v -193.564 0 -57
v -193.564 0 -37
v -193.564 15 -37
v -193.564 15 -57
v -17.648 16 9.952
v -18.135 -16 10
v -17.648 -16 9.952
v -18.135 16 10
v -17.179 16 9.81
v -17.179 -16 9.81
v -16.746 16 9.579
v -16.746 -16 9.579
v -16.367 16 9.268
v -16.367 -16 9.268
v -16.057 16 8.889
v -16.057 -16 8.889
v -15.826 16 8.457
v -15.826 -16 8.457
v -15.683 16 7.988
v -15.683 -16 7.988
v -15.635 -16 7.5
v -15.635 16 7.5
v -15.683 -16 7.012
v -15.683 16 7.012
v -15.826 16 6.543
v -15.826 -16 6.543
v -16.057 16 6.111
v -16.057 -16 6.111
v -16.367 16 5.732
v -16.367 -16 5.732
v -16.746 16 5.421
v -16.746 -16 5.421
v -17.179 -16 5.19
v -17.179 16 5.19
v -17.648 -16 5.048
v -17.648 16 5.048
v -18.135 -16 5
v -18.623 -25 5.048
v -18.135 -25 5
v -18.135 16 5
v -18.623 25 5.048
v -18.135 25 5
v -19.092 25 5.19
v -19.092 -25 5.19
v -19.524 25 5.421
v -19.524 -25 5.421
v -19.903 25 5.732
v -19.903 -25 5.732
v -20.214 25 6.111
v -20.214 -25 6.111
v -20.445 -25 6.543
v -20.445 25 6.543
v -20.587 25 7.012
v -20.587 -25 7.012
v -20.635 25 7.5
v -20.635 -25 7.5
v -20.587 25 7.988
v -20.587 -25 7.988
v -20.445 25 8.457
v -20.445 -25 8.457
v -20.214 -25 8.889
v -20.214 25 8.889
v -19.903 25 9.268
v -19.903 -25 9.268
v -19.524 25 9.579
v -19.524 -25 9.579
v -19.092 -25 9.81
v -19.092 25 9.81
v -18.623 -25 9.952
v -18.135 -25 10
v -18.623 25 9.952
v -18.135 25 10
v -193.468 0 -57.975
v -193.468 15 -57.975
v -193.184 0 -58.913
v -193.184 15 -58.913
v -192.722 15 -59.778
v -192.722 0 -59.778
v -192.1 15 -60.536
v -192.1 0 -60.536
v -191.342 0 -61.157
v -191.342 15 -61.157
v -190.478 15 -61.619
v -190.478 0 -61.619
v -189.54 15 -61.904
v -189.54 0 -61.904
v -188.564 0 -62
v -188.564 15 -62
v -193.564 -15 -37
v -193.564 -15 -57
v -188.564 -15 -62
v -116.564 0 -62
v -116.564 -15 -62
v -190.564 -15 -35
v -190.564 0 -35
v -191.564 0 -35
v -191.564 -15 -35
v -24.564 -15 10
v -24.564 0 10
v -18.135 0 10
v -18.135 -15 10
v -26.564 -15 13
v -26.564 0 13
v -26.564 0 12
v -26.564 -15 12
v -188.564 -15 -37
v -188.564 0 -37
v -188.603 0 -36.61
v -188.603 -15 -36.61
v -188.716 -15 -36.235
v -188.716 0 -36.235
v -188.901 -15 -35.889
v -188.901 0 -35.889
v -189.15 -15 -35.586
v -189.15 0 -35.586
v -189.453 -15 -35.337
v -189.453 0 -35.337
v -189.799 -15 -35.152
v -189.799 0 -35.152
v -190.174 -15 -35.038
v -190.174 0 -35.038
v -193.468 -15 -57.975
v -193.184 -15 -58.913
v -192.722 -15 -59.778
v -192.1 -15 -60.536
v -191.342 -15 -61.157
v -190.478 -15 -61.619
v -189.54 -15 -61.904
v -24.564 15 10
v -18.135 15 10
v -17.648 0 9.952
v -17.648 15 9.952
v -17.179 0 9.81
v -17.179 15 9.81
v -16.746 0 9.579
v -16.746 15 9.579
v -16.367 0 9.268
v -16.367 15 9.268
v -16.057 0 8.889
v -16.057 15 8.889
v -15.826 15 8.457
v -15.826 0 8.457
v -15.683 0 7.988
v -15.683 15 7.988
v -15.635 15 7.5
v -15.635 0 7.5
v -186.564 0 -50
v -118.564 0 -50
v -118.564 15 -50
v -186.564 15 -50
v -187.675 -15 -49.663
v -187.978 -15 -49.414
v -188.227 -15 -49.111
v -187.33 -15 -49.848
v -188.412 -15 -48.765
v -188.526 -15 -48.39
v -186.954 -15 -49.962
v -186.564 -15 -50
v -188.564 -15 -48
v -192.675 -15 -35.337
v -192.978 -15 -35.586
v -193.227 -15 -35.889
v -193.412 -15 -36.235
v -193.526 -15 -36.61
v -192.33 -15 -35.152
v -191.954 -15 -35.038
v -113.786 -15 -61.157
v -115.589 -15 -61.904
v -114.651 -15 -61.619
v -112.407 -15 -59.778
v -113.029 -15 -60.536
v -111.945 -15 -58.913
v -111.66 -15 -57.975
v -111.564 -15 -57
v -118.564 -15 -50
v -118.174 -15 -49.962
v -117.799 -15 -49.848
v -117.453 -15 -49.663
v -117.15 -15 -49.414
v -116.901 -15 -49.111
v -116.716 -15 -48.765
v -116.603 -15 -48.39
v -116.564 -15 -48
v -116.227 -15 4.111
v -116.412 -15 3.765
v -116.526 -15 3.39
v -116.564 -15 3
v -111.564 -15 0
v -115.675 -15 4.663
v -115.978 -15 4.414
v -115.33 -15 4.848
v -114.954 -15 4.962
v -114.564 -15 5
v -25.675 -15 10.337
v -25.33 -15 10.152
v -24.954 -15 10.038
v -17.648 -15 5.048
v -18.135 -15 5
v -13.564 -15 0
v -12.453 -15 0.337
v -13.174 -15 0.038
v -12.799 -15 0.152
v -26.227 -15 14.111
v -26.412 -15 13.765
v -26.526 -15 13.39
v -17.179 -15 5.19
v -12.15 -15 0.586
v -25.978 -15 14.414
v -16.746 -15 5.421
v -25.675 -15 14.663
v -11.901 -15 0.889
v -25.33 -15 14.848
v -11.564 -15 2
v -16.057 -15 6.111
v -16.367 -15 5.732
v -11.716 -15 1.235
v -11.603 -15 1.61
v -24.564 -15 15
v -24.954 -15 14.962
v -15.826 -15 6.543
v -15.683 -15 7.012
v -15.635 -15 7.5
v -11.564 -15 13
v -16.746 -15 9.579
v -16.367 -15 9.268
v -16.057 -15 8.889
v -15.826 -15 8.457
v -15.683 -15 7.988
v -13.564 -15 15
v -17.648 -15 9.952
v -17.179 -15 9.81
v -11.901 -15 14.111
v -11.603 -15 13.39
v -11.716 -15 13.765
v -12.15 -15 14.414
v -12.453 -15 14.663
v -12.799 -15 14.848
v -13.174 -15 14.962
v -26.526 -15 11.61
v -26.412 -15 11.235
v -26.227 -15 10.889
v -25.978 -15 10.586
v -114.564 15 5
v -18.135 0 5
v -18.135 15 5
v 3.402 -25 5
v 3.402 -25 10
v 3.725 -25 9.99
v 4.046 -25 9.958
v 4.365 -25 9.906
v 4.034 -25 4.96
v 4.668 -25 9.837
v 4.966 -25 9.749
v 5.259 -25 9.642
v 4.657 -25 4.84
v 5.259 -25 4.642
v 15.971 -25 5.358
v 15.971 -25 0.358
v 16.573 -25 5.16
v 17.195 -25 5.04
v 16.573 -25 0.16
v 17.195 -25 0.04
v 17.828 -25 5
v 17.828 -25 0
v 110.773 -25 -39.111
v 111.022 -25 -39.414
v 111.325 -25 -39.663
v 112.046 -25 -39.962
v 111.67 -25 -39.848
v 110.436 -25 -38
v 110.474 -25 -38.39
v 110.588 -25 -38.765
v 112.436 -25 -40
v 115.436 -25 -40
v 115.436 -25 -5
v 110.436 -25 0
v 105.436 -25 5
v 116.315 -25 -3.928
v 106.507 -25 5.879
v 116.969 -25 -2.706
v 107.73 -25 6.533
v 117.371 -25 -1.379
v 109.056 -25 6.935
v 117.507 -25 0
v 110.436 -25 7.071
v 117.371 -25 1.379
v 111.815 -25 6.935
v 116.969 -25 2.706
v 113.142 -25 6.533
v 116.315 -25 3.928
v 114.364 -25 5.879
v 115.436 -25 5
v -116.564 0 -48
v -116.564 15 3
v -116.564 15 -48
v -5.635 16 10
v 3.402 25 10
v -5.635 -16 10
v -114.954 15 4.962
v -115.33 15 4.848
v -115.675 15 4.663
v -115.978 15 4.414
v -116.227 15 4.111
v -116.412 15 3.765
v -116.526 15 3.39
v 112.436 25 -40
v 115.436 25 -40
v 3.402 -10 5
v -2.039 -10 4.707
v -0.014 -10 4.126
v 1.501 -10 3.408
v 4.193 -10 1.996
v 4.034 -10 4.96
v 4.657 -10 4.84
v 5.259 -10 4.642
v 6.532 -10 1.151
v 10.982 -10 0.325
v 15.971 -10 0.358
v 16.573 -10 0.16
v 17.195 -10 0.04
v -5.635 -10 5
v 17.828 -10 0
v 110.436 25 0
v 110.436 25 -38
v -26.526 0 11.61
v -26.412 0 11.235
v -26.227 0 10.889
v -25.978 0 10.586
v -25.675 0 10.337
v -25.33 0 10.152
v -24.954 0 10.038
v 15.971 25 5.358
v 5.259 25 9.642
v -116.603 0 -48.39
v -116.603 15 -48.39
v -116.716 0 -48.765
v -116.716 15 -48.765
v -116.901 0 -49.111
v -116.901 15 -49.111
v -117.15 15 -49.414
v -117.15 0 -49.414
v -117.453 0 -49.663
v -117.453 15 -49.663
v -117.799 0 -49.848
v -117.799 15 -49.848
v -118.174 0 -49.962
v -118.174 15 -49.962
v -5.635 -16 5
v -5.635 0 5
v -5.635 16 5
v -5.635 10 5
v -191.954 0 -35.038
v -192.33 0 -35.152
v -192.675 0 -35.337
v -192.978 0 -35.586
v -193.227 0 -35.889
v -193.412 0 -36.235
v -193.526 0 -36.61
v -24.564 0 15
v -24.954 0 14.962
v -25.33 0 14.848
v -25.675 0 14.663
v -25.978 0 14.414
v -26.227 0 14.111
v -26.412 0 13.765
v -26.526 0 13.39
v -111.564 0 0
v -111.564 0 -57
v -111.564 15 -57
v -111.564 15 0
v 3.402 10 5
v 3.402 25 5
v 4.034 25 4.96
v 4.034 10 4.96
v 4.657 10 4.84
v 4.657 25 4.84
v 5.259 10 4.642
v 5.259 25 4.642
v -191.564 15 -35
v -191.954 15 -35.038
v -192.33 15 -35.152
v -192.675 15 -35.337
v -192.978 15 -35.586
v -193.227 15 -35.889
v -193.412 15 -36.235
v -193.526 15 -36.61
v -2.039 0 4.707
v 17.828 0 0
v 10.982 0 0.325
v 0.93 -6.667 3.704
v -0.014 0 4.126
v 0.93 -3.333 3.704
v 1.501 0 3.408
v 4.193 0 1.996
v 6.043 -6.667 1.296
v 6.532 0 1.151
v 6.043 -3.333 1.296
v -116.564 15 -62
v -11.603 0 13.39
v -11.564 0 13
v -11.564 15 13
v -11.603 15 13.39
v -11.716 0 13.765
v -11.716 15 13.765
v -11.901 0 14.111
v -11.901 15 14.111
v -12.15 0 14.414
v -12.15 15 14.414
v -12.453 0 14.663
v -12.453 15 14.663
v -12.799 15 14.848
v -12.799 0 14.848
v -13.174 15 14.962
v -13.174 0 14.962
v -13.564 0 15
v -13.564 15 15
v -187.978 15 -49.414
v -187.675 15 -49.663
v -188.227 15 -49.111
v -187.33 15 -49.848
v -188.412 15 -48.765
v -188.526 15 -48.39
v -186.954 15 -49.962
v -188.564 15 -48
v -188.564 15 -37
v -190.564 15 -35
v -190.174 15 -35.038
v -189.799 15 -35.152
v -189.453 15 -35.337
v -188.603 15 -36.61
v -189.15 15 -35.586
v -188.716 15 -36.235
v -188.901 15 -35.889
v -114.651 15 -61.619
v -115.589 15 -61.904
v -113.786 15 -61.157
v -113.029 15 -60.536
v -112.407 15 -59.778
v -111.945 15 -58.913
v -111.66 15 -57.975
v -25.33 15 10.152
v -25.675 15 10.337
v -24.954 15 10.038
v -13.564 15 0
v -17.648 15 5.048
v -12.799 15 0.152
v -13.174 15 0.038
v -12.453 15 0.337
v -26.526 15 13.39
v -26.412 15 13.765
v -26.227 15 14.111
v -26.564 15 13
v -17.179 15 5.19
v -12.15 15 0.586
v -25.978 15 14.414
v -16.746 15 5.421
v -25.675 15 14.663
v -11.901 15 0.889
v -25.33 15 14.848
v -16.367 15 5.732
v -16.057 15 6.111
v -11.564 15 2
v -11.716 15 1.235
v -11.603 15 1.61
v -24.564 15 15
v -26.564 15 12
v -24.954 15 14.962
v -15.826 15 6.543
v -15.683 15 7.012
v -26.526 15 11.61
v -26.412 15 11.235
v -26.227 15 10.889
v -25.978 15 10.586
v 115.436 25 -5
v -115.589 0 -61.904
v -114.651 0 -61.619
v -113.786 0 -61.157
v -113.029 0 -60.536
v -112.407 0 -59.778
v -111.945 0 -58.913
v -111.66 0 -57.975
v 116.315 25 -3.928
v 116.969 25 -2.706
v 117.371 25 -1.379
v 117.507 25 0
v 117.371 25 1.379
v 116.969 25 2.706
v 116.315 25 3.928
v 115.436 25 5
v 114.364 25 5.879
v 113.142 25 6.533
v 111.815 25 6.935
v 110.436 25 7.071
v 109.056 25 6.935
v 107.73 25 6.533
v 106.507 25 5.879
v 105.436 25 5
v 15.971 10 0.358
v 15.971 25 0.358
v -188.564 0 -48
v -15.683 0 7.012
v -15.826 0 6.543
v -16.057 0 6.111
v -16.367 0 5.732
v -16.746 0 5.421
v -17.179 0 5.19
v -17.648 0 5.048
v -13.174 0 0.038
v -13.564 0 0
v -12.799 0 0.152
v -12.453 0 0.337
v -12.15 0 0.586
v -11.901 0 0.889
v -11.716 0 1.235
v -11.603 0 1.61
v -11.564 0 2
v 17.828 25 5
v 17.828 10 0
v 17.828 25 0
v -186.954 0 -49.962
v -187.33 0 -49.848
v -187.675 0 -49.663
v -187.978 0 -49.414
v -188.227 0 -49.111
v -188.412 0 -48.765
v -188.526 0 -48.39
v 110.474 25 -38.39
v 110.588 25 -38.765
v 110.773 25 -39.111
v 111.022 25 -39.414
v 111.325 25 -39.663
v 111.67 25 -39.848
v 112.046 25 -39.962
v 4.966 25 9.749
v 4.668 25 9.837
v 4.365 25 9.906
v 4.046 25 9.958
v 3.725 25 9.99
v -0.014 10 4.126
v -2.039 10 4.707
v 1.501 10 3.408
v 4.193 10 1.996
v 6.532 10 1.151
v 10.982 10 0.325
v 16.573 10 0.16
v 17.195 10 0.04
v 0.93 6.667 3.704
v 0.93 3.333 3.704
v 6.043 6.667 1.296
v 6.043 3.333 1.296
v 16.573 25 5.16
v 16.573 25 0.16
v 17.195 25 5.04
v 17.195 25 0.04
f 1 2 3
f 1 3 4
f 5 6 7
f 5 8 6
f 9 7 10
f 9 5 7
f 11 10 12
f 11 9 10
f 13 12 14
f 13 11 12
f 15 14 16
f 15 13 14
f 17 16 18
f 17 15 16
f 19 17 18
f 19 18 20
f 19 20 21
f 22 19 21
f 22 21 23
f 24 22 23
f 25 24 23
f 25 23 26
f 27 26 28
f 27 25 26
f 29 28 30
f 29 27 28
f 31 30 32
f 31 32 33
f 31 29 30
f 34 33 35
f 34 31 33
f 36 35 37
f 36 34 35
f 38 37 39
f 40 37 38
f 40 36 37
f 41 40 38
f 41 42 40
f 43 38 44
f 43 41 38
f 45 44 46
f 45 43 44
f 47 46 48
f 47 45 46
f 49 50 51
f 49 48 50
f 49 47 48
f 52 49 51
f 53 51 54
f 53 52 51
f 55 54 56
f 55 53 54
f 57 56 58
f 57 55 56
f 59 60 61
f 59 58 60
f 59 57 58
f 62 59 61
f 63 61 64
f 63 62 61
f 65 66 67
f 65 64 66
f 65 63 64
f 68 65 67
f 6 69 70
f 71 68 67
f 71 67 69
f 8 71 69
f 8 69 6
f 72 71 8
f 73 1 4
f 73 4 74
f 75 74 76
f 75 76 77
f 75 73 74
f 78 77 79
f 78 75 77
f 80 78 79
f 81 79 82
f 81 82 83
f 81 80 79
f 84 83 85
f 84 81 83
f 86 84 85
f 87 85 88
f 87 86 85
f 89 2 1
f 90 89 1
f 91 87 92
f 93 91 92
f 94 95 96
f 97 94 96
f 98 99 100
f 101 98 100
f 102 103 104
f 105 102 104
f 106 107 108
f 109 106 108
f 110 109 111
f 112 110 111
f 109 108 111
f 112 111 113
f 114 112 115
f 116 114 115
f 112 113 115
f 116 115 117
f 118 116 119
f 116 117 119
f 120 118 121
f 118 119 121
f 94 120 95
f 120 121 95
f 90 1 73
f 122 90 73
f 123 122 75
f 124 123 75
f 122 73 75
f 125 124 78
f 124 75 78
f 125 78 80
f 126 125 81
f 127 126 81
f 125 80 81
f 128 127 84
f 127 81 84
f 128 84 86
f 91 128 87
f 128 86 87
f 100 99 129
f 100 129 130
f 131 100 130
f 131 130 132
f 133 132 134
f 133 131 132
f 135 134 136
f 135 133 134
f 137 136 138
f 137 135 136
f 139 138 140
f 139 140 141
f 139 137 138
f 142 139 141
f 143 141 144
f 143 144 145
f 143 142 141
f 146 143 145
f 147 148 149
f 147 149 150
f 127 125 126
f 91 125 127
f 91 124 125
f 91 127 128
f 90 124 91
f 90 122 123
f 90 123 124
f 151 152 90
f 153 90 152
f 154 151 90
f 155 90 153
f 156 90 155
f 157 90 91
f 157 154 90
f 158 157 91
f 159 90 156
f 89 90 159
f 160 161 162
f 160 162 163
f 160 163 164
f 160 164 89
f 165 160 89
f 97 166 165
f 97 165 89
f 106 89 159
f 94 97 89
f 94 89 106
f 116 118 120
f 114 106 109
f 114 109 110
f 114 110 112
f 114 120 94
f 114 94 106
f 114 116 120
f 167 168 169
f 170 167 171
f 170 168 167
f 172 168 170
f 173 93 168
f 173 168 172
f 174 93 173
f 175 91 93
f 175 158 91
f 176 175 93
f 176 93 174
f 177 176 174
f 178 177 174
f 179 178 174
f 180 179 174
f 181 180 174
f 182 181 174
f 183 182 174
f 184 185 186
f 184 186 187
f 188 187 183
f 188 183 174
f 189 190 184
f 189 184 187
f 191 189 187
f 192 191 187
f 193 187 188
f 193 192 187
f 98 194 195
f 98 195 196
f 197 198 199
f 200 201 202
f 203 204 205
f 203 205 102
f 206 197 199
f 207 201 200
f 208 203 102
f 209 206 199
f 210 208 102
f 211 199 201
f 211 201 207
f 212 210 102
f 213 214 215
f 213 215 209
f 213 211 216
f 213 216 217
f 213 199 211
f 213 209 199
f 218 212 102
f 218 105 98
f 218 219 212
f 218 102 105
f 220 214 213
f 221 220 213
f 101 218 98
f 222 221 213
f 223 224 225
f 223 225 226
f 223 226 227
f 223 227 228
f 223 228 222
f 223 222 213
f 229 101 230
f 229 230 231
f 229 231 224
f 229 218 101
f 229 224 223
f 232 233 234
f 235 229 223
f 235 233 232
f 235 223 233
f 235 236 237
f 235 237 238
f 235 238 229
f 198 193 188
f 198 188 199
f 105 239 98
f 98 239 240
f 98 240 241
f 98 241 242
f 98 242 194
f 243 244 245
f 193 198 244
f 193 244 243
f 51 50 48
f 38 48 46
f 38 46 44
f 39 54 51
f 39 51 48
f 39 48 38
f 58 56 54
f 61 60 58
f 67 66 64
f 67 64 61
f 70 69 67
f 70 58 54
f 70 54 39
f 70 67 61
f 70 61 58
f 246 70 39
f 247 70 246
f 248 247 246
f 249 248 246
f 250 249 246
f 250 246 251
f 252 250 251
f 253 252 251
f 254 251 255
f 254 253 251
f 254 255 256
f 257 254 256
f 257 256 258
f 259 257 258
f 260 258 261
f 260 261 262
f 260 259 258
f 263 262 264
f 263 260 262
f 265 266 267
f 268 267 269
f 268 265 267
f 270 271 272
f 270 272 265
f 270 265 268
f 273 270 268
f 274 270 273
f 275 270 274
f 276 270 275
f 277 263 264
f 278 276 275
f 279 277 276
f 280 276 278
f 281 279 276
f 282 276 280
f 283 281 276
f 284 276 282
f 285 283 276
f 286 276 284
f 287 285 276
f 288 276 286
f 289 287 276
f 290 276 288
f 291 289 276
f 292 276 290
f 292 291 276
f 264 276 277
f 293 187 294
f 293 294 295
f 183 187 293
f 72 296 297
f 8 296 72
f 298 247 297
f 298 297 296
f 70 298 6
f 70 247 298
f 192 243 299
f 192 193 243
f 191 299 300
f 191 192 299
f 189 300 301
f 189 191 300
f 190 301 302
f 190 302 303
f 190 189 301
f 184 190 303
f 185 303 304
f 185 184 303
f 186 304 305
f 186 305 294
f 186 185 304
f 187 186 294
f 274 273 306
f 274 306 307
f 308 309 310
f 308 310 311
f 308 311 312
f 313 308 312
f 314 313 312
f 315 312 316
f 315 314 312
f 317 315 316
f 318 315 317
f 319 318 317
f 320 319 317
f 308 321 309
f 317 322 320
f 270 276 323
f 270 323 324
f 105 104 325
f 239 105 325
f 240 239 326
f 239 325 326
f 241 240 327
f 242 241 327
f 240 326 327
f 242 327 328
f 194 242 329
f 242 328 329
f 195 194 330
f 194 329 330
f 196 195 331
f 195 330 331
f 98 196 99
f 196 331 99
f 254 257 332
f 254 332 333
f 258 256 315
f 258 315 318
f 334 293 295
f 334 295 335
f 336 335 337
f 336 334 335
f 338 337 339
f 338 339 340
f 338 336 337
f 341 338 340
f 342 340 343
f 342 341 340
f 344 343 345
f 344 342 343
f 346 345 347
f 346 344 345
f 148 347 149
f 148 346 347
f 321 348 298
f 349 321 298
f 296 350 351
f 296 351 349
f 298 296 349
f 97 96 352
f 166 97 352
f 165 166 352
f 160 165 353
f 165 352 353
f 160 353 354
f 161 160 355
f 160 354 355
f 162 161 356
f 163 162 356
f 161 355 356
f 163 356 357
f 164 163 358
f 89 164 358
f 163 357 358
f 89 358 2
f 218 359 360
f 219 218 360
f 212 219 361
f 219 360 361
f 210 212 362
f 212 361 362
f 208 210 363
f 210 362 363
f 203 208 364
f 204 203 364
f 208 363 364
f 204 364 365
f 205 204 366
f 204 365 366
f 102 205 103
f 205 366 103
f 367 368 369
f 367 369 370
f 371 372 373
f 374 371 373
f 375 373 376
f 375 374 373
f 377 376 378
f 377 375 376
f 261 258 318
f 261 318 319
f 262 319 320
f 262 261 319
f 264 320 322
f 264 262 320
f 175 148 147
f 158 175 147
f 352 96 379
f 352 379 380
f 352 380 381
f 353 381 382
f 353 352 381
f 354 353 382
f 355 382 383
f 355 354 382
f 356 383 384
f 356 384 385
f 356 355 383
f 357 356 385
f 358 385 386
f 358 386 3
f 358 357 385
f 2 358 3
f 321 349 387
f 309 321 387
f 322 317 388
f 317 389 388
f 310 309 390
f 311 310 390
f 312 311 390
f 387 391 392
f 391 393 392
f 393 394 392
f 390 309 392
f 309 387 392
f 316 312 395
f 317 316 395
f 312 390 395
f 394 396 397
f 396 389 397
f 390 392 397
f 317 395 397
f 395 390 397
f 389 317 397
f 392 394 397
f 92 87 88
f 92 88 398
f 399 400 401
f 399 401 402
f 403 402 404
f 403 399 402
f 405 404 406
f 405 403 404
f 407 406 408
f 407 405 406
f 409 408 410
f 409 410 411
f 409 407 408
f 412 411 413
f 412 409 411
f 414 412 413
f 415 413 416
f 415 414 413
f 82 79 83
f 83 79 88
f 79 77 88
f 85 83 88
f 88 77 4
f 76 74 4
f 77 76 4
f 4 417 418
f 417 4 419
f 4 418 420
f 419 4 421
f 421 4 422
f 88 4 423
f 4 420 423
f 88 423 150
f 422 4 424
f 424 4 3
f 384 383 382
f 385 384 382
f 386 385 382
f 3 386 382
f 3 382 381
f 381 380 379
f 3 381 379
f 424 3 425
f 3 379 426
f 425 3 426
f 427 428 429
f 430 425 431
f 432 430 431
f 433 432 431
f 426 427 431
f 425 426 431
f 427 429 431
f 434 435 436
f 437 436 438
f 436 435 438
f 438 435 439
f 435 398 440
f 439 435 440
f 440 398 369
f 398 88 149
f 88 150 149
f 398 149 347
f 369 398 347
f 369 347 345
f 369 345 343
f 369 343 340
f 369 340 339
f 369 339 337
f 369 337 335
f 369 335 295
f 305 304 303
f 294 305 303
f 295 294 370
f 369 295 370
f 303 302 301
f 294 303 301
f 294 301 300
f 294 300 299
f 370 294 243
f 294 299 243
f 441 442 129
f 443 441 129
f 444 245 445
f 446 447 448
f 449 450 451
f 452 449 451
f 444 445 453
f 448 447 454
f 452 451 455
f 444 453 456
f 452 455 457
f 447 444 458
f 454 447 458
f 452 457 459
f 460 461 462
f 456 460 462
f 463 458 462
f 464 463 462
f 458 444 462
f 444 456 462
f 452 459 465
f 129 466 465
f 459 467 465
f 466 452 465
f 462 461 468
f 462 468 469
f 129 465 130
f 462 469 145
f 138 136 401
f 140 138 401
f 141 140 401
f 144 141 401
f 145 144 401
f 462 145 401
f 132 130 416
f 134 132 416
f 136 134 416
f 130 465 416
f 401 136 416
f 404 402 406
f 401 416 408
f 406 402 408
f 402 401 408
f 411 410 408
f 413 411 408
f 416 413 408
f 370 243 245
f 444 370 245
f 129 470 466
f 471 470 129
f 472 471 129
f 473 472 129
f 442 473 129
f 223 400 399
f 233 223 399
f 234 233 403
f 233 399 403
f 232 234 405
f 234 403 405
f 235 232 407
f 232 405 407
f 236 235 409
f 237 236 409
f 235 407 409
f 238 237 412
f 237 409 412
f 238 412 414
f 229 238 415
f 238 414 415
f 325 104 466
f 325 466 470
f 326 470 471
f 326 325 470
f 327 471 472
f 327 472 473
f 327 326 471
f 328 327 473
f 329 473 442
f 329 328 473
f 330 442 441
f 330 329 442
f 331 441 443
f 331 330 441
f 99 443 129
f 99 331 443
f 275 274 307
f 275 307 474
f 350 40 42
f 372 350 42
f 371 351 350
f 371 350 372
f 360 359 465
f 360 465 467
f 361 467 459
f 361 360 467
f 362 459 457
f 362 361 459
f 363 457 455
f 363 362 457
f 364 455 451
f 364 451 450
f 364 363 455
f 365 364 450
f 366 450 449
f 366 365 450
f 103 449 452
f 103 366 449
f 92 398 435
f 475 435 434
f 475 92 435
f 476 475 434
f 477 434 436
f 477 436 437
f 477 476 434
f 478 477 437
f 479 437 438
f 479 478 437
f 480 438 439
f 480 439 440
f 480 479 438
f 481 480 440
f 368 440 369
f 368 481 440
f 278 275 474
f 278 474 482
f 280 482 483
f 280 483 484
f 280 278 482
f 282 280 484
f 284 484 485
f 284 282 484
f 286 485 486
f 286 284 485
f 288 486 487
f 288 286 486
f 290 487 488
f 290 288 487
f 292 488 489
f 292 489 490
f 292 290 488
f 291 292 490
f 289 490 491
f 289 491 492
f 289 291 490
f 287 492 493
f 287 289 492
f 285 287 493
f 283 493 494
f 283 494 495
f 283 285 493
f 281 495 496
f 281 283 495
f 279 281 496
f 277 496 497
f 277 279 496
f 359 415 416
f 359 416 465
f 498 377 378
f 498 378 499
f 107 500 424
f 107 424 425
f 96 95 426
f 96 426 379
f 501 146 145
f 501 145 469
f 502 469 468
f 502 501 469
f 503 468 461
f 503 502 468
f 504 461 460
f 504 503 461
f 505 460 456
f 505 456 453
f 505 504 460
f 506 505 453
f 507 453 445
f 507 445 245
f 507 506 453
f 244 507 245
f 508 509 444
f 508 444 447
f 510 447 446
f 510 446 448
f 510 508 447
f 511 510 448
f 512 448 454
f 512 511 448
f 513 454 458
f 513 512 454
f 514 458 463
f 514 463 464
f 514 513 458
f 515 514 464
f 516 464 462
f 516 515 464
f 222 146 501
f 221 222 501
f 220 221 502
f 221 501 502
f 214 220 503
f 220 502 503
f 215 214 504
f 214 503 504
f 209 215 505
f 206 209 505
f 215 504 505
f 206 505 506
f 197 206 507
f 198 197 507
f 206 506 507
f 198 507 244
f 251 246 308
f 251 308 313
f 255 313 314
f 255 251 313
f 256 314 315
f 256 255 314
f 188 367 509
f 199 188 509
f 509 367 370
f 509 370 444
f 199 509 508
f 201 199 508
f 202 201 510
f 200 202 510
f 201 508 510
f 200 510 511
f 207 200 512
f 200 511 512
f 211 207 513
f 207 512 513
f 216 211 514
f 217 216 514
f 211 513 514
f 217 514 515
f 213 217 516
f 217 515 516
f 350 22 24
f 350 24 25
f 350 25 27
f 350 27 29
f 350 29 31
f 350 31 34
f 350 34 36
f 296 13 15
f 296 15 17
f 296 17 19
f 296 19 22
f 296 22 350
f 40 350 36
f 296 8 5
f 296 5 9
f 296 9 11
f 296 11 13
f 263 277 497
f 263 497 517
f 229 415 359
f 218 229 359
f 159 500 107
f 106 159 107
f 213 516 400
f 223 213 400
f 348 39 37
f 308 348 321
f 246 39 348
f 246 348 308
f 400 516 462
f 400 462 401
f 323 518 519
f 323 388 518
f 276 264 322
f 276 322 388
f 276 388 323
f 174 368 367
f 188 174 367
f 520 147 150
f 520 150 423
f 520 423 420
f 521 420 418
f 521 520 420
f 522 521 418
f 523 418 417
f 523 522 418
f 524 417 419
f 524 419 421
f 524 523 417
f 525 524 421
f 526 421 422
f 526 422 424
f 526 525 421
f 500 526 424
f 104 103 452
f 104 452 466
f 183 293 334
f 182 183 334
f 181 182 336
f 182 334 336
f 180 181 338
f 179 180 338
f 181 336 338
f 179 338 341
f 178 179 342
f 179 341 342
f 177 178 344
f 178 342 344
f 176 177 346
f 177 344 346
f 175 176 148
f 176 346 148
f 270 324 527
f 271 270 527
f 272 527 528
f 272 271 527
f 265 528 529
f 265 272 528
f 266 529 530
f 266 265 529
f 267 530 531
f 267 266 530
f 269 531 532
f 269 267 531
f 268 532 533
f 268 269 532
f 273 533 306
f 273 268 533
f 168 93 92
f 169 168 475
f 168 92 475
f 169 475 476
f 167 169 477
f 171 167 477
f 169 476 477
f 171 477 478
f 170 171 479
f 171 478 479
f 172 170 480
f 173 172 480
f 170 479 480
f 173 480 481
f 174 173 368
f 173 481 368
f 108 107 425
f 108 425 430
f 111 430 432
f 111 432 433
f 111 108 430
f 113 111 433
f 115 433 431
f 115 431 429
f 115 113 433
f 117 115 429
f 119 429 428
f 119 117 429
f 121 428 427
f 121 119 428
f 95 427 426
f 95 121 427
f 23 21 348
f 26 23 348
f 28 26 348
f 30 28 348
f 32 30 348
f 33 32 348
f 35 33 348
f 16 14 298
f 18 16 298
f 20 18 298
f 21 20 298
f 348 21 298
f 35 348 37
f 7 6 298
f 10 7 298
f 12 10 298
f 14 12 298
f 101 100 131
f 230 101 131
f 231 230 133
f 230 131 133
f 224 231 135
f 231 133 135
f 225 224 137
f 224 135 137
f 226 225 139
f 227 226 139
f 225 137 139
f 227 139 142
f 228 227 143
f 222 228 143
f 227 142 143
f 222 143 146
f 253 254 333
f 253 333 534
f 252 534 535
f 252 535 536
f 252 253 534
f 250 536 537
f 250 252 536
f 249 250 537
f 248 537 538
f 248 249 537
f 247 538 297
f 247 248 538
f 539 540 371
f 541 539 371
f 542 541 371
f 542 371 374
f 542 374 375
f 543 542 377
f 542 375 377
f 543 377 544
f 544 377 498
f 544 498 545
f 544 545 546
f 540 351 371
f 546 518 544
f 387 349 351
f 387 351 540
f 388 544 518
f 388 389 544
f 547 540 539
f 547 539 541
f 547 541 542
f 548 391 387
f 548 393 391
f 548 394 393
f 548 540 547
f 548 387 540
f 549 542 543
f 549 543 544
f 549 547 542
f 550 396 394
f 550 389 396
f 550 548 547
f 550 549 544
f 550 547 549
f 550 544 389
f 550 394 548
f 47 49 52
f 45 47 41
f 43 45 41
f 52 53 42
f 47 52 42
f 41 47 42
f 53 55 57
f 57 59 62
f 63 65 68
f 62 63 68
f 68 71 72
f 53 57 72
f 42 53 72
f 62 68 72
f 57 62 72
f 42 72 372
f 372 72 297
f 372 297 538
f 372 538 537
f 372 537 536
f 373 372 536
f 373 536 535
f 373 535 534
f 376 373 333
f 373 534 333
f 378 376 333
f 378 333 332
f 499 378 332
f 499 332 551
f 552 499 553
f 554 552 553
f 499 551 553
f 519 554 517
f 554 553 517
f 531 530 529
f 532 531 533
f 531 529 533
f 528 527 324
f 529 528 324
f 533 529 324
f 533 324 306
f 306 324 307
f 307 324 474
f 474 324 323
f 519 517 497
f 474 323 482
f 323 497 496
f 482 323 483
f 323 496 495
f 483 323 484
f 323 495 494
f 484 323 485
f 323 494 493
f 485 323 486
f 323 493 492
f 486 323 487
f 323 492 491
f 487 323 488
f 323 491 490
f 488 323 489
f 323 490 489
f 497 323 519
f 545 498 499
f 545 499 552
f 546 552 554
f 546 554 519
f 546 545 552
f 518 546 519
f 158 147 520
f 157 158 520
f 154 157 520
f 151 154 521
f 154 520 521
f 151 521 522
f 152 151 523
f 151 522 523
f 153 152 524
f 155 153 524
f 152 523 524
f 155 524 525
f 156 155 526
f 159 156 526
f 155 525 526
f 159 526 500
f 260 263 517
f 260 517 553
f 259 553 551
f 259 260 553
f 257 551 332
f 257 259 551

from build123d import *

# Parameters (mm, degrees)
F1_DEPTH      = 15
F1_DEPTH_BACK = 15
F0_W          = 5.9289547801
F0_H          = 5
F2_DEPTH      = 25
F2_DEPTH_BACK = 25
F3_DEPTH      = 16
F3_DEPTH_BACK = 16
F4_DEPTH      = 10
F4_DEPTH_BACK = 10


with BuildPart() as f1:
    # F0 (on Front) → F1 (new body, two sides)
    with BuildSketch(Plane.XZ) as f1_sk:
        with BuildLine():
            Line((-18.1352669001, 5), (-111.5642216802, 5))
            Line((-111.5642216802, 5), (-114.5642216802, 5))
            ThreePointArc((-114.5642216802, 5), (-115.9784352425, 4.4142135624), (-116.5642216802, 3))
            Line((-116.5642216802, 3), (-116.5642216802, -48))
            ThreePointArc((-116.5642216802, -48), (-117.1500081178, -49.4142135624), (-118.5642216802, -50))
            Line((-118.5642216802, -50), (-186.5642216802, -50))
            ThreePointArc((-186.5642216802, -50), (-187.9784352425, -49.4142135624), (-188.5642216802, -48))
            Line((-188.5642216802, -48), (-188.5642216802, -37))
            ThreePointArc((-188.5642216802, -37), (-189.1500081178, -35.5857864376), (-190.5642216802, -35))
            Line((-190.5642216802, -35), (-191.5642216802, -35))
            ThreePointArc((-191.5642216802, -35), (-192.9784352425, -35.5857864376), (-193.5642216802, -37))
            Line((-193.5642216802, -37), (-193.5642216802, -50))
            Line((-193.5642216802, -50), (-193.5642216802, -57))
            ThreePointArc((-193.5642216802, -57), (-192.0997555861, -60.5355339059), (-188.5642216802, -62))
            Line((-188.5642216802, -62), (-116.5642216802, -62))
            ThreePointArc((-116.5642216802, -62), (-113.0286877742, -60.5355339059), (-111.5642216802, -57))
            Line((-111.5642216802, -57), (-111.5642216802, -50))
            Line((-111.5642216802, -50), (-111.5642216802, 0))
            Line((-111.5642216802, 0), (-13.5642216802, 0))
            ThreePointArc((-13.5642216802, 0), (-12.1500081178, 0.5857864376), (-11.5642216802, 2))
            Line((-11.5642216802, 2), (-11.5642216802, 5))
            Line((-11.5642216802, 5), (-15.6352669001, 5))
            Line((-15.6352669001, 5), (-18.1352669001, 5))
        make_face()
        with BuildLine():
            Line((-24.5642216802, 10), (-18.1352669001, 10))
            Line((-18.1352669001, 10), (-15.6352669001, 10))
            Line((-15.6352669001, 10), (-11.5642216802, 10))
            Line((-11.5642216802, 10), (-11.5642216802, 13))
            ThreePointArc((-11.5642216802, 13), (-12.1500081178, 14.4142135624), (-13.5642216802, 15))
            Line((-13.5642216802, 15), (-24.5642216802, 15))
            ThreePointArc((-24.5642216802, 15), (-25.9784352425, 14.4142135624), (-26.5642216802, 13))
            Line((-26.5642216802, 13), (-26.5642216802, 12))
            ThreePointArc((-26.5642216802, 12), (-25.9784352425, 10.5857864376), (-24.5642216802, 10))
        make_face()
        with BuildLine():
            Line((-15.6352669001, 10), (-18.1352669001, 10))
            ThreePointArc((-18.1352669001, 10), (-16.3674999471, 9.267766953), (-15.6352669001, 7.5))
            Line((-15.6352669001, 7.5), (-15.6352669001, 10))
        make_face()
        Polygon((-15.6352669001, 7.5), (-15.6352669001, 5), (-11.5642216802, 5), (-11.5642216802, 10), (-15.6352669001, 10), align=None)
        with BuildLine():
            ThreePointArc((-15.6352669001, 7.5), (-16.3674999471, 5.732233047), (-18.1352669001, 5))
            Line((-18.1352669001, 5), (-15.6352669001, 5))
            Line((-15.6352669001, 5), (-15.6352669001, 7.5))
        make_face()
    extrude(amount=F1_DEPTH)
    extrude(f1_sk.sketch, amount=-F1_DEPTH_BACK)


with BuildPart() as f2:
    # F0 (on Front) → F2 (new body, two sides)
    with BuildSketch(Plane.XZ) as f2_sk:
        with BuildLine():
            ThreePointArc((-18.1352669001, 10), (-20.6352669001, 7.5), (-18.1352669001, 5))
            Line((-18.1352669001, 5), (-18.1352669001, 10))
        make_face()
        with BuildLine():
            Line((-18.1352669001, 10), (-18.1352669001, 5))
            ThreePointArc((-18.1352669001, 5), (-16.3674999471, 5.732233047), (-15.6352669001, 7.5))
            ThreePointArc((-15.6352669001, 7.5), (-16.3674999471, 9.267766953), (-18.1352669001, 10))
        make_face()
        with BuildLine():
            Line((-15.6352669001, 10), (-18.1352669001, 10))
            ThreePointArc((-18.1352669001, 10), (-16.3674999471, 9.267766953), (-15.6352669001, 7.5))
            Line((-15.6352669001, 7.5), (-15.6352669001, 10))
        make_face()
        with BuildLine():
            ThreePointArc((-15.6352669001, 7.5), (-16.3674999471, 5.732233047), (-18.1352669001, 5))
            Line((-18.1352669001, 5), (-15.6352669001, 5))
            Line((-15.6352669001, 5), (-15.6352669001, 7.5))
        make_face()
        Polygon((-15.6352669001, 7.5), (-15.6352669001, 5), (-11.5642216802, 5), (-11.5642216802, 10), (-15.6352669001, 10), align=None)
        with Locations((-8.5997442901, 7.5)):
            Rectangle(F0_W, F0_H)
        with BuildLine():
            Line((-5.6352669001, 10), (-5.6352669001, 5))
            Line((-5.6352669001, 5), (3.4018210821, 5))
            ThreePointArc((3.4018210821, 5), (4.3473586879, 4.9097819337), (5.2587744639, 4.6423834544))
            Line((5.2587744639, 4.6423834544), (15.970691736, 0.3576165456))
            ThreePointArc((15.970691736, 0.3576165456), (16.882107512, 0.0902180663), (17.8276451178, 0))
            Line((17.8276451178, 0), (110.4357783198, 0))
            Line((110.4357783198, 0), (110.4357783198, -38))
            ThreePointArc((110.4357783198, -38), (111.0215647575, -39.4142135624), (112.4357783198, -40))
            Line((112.4357783198, -40), (115.4357783198, -40))
            Line((115.4357783198, -40), (115.4357783198, -5))
            ThreePointArc((115.4357783198, -5), (115.4357783198, 5), (105.4357783198, 5))
            Line((105.4357783198, 5), (17.8276451178, 5))
            ThreePointArc((17.8276451178, 5), (16.882107512, 5.0902180663), (15.970691736, 5.3576165456))
            Line((15.970691736, 5.3576165456), (5.2587744639, 9.6423834544))
            ThreePointArc((5.2587744639, 9.6423834544), (4.8179202782, 9.7952750773), (4.3647330999, 9.9064040239))
            ThreePointArc((4.3647330999, 9.9064040239), (3.8855461489, 9.976545997), (3.4018210821, 10))
            Line((3.4018210821, 10), (-5.6352669001, 10))
        make_face()
    extrude(amount=F2_DEPTH)
    extrude(f2_sk.sketch, amount=-F2_DEPTH_BACK)

    # F0 (on Front) → F3 (cut, two sides)
    with BuildSketch(Plane.XZ) as f3_sk:
        with BuildLine():
            Line((-15.6352669001, 10), (-18.1352669001, 10))
            ThreePointArc((-18.1352669001, 10), (-16.3674999471, 9.267766953), (-15.6352669001, 7.5))
            Line((-15.6352669001, 7.5), (-15.6352669001, 10))
        make_face()
        with BuildLine():
            ThreePointArc((-15.6352669001, 7.5), (-16.3674999471, 5.732233047), (-18.1352669001, 5))
            Line((-18.1352669001, 5), (-15.6352669001, 5))
            Line((-15.6352669001, 5), (-15.6352669001, 7.5))
        make_face()
        Polygon((-15.6352669001, 7.5), (-15.6352669001, 5), (-11.5642216802, 5), (-11.5642216802, 10), (-15.6352669001, 10), align=None)
        with Locations((-8.5997442901, 7.5)):
            Rectangle(F0_W, F0_H)
    extrude(amount=-F3_DEPTH, mode=Mode.SUBTRACT)
    extrude(f3_sk.sketch, amount=F3_DEPTH_BACK, mode=Mode.SUBTRACT)

    # F0 (on Front) → F4 (join, two sides)
    with BuildSketch(Plane.XZ) as f4_sk:
        with BuildLine():
            Line((3.4018210821, 5), (-5.6352669001, 5))
            add(Edge.make_bspline(
                [(-5.6352669001, 5), (4.3647330999, 5), (0, 0), (17.8276451178, 0)],
                knots=[0, 0, 0, 0, 23.9897528198, 23.9897528198, 23.9897528198, 23.9897528198], degree=3))
            ThreePointArc((17.8276451178, 0), (16.882107512, 0.0902180663), (15.970691736, 0.3576165456))
            Line((15.970691736, 0.3576165456), (5.2587744639, 4.6423834544))
            ThreePointArc((5.2587744639, 4.6423834544), (4.3473586879, 4.9097819337), (3.4018210821, 5))
        make_face()
    extrude(amount=F4_DEPTH)
    extrude(f4_sk.sketch, amount=-F4_DEPTH_BACK)


solid = Compound([f1.part, f2.part])
